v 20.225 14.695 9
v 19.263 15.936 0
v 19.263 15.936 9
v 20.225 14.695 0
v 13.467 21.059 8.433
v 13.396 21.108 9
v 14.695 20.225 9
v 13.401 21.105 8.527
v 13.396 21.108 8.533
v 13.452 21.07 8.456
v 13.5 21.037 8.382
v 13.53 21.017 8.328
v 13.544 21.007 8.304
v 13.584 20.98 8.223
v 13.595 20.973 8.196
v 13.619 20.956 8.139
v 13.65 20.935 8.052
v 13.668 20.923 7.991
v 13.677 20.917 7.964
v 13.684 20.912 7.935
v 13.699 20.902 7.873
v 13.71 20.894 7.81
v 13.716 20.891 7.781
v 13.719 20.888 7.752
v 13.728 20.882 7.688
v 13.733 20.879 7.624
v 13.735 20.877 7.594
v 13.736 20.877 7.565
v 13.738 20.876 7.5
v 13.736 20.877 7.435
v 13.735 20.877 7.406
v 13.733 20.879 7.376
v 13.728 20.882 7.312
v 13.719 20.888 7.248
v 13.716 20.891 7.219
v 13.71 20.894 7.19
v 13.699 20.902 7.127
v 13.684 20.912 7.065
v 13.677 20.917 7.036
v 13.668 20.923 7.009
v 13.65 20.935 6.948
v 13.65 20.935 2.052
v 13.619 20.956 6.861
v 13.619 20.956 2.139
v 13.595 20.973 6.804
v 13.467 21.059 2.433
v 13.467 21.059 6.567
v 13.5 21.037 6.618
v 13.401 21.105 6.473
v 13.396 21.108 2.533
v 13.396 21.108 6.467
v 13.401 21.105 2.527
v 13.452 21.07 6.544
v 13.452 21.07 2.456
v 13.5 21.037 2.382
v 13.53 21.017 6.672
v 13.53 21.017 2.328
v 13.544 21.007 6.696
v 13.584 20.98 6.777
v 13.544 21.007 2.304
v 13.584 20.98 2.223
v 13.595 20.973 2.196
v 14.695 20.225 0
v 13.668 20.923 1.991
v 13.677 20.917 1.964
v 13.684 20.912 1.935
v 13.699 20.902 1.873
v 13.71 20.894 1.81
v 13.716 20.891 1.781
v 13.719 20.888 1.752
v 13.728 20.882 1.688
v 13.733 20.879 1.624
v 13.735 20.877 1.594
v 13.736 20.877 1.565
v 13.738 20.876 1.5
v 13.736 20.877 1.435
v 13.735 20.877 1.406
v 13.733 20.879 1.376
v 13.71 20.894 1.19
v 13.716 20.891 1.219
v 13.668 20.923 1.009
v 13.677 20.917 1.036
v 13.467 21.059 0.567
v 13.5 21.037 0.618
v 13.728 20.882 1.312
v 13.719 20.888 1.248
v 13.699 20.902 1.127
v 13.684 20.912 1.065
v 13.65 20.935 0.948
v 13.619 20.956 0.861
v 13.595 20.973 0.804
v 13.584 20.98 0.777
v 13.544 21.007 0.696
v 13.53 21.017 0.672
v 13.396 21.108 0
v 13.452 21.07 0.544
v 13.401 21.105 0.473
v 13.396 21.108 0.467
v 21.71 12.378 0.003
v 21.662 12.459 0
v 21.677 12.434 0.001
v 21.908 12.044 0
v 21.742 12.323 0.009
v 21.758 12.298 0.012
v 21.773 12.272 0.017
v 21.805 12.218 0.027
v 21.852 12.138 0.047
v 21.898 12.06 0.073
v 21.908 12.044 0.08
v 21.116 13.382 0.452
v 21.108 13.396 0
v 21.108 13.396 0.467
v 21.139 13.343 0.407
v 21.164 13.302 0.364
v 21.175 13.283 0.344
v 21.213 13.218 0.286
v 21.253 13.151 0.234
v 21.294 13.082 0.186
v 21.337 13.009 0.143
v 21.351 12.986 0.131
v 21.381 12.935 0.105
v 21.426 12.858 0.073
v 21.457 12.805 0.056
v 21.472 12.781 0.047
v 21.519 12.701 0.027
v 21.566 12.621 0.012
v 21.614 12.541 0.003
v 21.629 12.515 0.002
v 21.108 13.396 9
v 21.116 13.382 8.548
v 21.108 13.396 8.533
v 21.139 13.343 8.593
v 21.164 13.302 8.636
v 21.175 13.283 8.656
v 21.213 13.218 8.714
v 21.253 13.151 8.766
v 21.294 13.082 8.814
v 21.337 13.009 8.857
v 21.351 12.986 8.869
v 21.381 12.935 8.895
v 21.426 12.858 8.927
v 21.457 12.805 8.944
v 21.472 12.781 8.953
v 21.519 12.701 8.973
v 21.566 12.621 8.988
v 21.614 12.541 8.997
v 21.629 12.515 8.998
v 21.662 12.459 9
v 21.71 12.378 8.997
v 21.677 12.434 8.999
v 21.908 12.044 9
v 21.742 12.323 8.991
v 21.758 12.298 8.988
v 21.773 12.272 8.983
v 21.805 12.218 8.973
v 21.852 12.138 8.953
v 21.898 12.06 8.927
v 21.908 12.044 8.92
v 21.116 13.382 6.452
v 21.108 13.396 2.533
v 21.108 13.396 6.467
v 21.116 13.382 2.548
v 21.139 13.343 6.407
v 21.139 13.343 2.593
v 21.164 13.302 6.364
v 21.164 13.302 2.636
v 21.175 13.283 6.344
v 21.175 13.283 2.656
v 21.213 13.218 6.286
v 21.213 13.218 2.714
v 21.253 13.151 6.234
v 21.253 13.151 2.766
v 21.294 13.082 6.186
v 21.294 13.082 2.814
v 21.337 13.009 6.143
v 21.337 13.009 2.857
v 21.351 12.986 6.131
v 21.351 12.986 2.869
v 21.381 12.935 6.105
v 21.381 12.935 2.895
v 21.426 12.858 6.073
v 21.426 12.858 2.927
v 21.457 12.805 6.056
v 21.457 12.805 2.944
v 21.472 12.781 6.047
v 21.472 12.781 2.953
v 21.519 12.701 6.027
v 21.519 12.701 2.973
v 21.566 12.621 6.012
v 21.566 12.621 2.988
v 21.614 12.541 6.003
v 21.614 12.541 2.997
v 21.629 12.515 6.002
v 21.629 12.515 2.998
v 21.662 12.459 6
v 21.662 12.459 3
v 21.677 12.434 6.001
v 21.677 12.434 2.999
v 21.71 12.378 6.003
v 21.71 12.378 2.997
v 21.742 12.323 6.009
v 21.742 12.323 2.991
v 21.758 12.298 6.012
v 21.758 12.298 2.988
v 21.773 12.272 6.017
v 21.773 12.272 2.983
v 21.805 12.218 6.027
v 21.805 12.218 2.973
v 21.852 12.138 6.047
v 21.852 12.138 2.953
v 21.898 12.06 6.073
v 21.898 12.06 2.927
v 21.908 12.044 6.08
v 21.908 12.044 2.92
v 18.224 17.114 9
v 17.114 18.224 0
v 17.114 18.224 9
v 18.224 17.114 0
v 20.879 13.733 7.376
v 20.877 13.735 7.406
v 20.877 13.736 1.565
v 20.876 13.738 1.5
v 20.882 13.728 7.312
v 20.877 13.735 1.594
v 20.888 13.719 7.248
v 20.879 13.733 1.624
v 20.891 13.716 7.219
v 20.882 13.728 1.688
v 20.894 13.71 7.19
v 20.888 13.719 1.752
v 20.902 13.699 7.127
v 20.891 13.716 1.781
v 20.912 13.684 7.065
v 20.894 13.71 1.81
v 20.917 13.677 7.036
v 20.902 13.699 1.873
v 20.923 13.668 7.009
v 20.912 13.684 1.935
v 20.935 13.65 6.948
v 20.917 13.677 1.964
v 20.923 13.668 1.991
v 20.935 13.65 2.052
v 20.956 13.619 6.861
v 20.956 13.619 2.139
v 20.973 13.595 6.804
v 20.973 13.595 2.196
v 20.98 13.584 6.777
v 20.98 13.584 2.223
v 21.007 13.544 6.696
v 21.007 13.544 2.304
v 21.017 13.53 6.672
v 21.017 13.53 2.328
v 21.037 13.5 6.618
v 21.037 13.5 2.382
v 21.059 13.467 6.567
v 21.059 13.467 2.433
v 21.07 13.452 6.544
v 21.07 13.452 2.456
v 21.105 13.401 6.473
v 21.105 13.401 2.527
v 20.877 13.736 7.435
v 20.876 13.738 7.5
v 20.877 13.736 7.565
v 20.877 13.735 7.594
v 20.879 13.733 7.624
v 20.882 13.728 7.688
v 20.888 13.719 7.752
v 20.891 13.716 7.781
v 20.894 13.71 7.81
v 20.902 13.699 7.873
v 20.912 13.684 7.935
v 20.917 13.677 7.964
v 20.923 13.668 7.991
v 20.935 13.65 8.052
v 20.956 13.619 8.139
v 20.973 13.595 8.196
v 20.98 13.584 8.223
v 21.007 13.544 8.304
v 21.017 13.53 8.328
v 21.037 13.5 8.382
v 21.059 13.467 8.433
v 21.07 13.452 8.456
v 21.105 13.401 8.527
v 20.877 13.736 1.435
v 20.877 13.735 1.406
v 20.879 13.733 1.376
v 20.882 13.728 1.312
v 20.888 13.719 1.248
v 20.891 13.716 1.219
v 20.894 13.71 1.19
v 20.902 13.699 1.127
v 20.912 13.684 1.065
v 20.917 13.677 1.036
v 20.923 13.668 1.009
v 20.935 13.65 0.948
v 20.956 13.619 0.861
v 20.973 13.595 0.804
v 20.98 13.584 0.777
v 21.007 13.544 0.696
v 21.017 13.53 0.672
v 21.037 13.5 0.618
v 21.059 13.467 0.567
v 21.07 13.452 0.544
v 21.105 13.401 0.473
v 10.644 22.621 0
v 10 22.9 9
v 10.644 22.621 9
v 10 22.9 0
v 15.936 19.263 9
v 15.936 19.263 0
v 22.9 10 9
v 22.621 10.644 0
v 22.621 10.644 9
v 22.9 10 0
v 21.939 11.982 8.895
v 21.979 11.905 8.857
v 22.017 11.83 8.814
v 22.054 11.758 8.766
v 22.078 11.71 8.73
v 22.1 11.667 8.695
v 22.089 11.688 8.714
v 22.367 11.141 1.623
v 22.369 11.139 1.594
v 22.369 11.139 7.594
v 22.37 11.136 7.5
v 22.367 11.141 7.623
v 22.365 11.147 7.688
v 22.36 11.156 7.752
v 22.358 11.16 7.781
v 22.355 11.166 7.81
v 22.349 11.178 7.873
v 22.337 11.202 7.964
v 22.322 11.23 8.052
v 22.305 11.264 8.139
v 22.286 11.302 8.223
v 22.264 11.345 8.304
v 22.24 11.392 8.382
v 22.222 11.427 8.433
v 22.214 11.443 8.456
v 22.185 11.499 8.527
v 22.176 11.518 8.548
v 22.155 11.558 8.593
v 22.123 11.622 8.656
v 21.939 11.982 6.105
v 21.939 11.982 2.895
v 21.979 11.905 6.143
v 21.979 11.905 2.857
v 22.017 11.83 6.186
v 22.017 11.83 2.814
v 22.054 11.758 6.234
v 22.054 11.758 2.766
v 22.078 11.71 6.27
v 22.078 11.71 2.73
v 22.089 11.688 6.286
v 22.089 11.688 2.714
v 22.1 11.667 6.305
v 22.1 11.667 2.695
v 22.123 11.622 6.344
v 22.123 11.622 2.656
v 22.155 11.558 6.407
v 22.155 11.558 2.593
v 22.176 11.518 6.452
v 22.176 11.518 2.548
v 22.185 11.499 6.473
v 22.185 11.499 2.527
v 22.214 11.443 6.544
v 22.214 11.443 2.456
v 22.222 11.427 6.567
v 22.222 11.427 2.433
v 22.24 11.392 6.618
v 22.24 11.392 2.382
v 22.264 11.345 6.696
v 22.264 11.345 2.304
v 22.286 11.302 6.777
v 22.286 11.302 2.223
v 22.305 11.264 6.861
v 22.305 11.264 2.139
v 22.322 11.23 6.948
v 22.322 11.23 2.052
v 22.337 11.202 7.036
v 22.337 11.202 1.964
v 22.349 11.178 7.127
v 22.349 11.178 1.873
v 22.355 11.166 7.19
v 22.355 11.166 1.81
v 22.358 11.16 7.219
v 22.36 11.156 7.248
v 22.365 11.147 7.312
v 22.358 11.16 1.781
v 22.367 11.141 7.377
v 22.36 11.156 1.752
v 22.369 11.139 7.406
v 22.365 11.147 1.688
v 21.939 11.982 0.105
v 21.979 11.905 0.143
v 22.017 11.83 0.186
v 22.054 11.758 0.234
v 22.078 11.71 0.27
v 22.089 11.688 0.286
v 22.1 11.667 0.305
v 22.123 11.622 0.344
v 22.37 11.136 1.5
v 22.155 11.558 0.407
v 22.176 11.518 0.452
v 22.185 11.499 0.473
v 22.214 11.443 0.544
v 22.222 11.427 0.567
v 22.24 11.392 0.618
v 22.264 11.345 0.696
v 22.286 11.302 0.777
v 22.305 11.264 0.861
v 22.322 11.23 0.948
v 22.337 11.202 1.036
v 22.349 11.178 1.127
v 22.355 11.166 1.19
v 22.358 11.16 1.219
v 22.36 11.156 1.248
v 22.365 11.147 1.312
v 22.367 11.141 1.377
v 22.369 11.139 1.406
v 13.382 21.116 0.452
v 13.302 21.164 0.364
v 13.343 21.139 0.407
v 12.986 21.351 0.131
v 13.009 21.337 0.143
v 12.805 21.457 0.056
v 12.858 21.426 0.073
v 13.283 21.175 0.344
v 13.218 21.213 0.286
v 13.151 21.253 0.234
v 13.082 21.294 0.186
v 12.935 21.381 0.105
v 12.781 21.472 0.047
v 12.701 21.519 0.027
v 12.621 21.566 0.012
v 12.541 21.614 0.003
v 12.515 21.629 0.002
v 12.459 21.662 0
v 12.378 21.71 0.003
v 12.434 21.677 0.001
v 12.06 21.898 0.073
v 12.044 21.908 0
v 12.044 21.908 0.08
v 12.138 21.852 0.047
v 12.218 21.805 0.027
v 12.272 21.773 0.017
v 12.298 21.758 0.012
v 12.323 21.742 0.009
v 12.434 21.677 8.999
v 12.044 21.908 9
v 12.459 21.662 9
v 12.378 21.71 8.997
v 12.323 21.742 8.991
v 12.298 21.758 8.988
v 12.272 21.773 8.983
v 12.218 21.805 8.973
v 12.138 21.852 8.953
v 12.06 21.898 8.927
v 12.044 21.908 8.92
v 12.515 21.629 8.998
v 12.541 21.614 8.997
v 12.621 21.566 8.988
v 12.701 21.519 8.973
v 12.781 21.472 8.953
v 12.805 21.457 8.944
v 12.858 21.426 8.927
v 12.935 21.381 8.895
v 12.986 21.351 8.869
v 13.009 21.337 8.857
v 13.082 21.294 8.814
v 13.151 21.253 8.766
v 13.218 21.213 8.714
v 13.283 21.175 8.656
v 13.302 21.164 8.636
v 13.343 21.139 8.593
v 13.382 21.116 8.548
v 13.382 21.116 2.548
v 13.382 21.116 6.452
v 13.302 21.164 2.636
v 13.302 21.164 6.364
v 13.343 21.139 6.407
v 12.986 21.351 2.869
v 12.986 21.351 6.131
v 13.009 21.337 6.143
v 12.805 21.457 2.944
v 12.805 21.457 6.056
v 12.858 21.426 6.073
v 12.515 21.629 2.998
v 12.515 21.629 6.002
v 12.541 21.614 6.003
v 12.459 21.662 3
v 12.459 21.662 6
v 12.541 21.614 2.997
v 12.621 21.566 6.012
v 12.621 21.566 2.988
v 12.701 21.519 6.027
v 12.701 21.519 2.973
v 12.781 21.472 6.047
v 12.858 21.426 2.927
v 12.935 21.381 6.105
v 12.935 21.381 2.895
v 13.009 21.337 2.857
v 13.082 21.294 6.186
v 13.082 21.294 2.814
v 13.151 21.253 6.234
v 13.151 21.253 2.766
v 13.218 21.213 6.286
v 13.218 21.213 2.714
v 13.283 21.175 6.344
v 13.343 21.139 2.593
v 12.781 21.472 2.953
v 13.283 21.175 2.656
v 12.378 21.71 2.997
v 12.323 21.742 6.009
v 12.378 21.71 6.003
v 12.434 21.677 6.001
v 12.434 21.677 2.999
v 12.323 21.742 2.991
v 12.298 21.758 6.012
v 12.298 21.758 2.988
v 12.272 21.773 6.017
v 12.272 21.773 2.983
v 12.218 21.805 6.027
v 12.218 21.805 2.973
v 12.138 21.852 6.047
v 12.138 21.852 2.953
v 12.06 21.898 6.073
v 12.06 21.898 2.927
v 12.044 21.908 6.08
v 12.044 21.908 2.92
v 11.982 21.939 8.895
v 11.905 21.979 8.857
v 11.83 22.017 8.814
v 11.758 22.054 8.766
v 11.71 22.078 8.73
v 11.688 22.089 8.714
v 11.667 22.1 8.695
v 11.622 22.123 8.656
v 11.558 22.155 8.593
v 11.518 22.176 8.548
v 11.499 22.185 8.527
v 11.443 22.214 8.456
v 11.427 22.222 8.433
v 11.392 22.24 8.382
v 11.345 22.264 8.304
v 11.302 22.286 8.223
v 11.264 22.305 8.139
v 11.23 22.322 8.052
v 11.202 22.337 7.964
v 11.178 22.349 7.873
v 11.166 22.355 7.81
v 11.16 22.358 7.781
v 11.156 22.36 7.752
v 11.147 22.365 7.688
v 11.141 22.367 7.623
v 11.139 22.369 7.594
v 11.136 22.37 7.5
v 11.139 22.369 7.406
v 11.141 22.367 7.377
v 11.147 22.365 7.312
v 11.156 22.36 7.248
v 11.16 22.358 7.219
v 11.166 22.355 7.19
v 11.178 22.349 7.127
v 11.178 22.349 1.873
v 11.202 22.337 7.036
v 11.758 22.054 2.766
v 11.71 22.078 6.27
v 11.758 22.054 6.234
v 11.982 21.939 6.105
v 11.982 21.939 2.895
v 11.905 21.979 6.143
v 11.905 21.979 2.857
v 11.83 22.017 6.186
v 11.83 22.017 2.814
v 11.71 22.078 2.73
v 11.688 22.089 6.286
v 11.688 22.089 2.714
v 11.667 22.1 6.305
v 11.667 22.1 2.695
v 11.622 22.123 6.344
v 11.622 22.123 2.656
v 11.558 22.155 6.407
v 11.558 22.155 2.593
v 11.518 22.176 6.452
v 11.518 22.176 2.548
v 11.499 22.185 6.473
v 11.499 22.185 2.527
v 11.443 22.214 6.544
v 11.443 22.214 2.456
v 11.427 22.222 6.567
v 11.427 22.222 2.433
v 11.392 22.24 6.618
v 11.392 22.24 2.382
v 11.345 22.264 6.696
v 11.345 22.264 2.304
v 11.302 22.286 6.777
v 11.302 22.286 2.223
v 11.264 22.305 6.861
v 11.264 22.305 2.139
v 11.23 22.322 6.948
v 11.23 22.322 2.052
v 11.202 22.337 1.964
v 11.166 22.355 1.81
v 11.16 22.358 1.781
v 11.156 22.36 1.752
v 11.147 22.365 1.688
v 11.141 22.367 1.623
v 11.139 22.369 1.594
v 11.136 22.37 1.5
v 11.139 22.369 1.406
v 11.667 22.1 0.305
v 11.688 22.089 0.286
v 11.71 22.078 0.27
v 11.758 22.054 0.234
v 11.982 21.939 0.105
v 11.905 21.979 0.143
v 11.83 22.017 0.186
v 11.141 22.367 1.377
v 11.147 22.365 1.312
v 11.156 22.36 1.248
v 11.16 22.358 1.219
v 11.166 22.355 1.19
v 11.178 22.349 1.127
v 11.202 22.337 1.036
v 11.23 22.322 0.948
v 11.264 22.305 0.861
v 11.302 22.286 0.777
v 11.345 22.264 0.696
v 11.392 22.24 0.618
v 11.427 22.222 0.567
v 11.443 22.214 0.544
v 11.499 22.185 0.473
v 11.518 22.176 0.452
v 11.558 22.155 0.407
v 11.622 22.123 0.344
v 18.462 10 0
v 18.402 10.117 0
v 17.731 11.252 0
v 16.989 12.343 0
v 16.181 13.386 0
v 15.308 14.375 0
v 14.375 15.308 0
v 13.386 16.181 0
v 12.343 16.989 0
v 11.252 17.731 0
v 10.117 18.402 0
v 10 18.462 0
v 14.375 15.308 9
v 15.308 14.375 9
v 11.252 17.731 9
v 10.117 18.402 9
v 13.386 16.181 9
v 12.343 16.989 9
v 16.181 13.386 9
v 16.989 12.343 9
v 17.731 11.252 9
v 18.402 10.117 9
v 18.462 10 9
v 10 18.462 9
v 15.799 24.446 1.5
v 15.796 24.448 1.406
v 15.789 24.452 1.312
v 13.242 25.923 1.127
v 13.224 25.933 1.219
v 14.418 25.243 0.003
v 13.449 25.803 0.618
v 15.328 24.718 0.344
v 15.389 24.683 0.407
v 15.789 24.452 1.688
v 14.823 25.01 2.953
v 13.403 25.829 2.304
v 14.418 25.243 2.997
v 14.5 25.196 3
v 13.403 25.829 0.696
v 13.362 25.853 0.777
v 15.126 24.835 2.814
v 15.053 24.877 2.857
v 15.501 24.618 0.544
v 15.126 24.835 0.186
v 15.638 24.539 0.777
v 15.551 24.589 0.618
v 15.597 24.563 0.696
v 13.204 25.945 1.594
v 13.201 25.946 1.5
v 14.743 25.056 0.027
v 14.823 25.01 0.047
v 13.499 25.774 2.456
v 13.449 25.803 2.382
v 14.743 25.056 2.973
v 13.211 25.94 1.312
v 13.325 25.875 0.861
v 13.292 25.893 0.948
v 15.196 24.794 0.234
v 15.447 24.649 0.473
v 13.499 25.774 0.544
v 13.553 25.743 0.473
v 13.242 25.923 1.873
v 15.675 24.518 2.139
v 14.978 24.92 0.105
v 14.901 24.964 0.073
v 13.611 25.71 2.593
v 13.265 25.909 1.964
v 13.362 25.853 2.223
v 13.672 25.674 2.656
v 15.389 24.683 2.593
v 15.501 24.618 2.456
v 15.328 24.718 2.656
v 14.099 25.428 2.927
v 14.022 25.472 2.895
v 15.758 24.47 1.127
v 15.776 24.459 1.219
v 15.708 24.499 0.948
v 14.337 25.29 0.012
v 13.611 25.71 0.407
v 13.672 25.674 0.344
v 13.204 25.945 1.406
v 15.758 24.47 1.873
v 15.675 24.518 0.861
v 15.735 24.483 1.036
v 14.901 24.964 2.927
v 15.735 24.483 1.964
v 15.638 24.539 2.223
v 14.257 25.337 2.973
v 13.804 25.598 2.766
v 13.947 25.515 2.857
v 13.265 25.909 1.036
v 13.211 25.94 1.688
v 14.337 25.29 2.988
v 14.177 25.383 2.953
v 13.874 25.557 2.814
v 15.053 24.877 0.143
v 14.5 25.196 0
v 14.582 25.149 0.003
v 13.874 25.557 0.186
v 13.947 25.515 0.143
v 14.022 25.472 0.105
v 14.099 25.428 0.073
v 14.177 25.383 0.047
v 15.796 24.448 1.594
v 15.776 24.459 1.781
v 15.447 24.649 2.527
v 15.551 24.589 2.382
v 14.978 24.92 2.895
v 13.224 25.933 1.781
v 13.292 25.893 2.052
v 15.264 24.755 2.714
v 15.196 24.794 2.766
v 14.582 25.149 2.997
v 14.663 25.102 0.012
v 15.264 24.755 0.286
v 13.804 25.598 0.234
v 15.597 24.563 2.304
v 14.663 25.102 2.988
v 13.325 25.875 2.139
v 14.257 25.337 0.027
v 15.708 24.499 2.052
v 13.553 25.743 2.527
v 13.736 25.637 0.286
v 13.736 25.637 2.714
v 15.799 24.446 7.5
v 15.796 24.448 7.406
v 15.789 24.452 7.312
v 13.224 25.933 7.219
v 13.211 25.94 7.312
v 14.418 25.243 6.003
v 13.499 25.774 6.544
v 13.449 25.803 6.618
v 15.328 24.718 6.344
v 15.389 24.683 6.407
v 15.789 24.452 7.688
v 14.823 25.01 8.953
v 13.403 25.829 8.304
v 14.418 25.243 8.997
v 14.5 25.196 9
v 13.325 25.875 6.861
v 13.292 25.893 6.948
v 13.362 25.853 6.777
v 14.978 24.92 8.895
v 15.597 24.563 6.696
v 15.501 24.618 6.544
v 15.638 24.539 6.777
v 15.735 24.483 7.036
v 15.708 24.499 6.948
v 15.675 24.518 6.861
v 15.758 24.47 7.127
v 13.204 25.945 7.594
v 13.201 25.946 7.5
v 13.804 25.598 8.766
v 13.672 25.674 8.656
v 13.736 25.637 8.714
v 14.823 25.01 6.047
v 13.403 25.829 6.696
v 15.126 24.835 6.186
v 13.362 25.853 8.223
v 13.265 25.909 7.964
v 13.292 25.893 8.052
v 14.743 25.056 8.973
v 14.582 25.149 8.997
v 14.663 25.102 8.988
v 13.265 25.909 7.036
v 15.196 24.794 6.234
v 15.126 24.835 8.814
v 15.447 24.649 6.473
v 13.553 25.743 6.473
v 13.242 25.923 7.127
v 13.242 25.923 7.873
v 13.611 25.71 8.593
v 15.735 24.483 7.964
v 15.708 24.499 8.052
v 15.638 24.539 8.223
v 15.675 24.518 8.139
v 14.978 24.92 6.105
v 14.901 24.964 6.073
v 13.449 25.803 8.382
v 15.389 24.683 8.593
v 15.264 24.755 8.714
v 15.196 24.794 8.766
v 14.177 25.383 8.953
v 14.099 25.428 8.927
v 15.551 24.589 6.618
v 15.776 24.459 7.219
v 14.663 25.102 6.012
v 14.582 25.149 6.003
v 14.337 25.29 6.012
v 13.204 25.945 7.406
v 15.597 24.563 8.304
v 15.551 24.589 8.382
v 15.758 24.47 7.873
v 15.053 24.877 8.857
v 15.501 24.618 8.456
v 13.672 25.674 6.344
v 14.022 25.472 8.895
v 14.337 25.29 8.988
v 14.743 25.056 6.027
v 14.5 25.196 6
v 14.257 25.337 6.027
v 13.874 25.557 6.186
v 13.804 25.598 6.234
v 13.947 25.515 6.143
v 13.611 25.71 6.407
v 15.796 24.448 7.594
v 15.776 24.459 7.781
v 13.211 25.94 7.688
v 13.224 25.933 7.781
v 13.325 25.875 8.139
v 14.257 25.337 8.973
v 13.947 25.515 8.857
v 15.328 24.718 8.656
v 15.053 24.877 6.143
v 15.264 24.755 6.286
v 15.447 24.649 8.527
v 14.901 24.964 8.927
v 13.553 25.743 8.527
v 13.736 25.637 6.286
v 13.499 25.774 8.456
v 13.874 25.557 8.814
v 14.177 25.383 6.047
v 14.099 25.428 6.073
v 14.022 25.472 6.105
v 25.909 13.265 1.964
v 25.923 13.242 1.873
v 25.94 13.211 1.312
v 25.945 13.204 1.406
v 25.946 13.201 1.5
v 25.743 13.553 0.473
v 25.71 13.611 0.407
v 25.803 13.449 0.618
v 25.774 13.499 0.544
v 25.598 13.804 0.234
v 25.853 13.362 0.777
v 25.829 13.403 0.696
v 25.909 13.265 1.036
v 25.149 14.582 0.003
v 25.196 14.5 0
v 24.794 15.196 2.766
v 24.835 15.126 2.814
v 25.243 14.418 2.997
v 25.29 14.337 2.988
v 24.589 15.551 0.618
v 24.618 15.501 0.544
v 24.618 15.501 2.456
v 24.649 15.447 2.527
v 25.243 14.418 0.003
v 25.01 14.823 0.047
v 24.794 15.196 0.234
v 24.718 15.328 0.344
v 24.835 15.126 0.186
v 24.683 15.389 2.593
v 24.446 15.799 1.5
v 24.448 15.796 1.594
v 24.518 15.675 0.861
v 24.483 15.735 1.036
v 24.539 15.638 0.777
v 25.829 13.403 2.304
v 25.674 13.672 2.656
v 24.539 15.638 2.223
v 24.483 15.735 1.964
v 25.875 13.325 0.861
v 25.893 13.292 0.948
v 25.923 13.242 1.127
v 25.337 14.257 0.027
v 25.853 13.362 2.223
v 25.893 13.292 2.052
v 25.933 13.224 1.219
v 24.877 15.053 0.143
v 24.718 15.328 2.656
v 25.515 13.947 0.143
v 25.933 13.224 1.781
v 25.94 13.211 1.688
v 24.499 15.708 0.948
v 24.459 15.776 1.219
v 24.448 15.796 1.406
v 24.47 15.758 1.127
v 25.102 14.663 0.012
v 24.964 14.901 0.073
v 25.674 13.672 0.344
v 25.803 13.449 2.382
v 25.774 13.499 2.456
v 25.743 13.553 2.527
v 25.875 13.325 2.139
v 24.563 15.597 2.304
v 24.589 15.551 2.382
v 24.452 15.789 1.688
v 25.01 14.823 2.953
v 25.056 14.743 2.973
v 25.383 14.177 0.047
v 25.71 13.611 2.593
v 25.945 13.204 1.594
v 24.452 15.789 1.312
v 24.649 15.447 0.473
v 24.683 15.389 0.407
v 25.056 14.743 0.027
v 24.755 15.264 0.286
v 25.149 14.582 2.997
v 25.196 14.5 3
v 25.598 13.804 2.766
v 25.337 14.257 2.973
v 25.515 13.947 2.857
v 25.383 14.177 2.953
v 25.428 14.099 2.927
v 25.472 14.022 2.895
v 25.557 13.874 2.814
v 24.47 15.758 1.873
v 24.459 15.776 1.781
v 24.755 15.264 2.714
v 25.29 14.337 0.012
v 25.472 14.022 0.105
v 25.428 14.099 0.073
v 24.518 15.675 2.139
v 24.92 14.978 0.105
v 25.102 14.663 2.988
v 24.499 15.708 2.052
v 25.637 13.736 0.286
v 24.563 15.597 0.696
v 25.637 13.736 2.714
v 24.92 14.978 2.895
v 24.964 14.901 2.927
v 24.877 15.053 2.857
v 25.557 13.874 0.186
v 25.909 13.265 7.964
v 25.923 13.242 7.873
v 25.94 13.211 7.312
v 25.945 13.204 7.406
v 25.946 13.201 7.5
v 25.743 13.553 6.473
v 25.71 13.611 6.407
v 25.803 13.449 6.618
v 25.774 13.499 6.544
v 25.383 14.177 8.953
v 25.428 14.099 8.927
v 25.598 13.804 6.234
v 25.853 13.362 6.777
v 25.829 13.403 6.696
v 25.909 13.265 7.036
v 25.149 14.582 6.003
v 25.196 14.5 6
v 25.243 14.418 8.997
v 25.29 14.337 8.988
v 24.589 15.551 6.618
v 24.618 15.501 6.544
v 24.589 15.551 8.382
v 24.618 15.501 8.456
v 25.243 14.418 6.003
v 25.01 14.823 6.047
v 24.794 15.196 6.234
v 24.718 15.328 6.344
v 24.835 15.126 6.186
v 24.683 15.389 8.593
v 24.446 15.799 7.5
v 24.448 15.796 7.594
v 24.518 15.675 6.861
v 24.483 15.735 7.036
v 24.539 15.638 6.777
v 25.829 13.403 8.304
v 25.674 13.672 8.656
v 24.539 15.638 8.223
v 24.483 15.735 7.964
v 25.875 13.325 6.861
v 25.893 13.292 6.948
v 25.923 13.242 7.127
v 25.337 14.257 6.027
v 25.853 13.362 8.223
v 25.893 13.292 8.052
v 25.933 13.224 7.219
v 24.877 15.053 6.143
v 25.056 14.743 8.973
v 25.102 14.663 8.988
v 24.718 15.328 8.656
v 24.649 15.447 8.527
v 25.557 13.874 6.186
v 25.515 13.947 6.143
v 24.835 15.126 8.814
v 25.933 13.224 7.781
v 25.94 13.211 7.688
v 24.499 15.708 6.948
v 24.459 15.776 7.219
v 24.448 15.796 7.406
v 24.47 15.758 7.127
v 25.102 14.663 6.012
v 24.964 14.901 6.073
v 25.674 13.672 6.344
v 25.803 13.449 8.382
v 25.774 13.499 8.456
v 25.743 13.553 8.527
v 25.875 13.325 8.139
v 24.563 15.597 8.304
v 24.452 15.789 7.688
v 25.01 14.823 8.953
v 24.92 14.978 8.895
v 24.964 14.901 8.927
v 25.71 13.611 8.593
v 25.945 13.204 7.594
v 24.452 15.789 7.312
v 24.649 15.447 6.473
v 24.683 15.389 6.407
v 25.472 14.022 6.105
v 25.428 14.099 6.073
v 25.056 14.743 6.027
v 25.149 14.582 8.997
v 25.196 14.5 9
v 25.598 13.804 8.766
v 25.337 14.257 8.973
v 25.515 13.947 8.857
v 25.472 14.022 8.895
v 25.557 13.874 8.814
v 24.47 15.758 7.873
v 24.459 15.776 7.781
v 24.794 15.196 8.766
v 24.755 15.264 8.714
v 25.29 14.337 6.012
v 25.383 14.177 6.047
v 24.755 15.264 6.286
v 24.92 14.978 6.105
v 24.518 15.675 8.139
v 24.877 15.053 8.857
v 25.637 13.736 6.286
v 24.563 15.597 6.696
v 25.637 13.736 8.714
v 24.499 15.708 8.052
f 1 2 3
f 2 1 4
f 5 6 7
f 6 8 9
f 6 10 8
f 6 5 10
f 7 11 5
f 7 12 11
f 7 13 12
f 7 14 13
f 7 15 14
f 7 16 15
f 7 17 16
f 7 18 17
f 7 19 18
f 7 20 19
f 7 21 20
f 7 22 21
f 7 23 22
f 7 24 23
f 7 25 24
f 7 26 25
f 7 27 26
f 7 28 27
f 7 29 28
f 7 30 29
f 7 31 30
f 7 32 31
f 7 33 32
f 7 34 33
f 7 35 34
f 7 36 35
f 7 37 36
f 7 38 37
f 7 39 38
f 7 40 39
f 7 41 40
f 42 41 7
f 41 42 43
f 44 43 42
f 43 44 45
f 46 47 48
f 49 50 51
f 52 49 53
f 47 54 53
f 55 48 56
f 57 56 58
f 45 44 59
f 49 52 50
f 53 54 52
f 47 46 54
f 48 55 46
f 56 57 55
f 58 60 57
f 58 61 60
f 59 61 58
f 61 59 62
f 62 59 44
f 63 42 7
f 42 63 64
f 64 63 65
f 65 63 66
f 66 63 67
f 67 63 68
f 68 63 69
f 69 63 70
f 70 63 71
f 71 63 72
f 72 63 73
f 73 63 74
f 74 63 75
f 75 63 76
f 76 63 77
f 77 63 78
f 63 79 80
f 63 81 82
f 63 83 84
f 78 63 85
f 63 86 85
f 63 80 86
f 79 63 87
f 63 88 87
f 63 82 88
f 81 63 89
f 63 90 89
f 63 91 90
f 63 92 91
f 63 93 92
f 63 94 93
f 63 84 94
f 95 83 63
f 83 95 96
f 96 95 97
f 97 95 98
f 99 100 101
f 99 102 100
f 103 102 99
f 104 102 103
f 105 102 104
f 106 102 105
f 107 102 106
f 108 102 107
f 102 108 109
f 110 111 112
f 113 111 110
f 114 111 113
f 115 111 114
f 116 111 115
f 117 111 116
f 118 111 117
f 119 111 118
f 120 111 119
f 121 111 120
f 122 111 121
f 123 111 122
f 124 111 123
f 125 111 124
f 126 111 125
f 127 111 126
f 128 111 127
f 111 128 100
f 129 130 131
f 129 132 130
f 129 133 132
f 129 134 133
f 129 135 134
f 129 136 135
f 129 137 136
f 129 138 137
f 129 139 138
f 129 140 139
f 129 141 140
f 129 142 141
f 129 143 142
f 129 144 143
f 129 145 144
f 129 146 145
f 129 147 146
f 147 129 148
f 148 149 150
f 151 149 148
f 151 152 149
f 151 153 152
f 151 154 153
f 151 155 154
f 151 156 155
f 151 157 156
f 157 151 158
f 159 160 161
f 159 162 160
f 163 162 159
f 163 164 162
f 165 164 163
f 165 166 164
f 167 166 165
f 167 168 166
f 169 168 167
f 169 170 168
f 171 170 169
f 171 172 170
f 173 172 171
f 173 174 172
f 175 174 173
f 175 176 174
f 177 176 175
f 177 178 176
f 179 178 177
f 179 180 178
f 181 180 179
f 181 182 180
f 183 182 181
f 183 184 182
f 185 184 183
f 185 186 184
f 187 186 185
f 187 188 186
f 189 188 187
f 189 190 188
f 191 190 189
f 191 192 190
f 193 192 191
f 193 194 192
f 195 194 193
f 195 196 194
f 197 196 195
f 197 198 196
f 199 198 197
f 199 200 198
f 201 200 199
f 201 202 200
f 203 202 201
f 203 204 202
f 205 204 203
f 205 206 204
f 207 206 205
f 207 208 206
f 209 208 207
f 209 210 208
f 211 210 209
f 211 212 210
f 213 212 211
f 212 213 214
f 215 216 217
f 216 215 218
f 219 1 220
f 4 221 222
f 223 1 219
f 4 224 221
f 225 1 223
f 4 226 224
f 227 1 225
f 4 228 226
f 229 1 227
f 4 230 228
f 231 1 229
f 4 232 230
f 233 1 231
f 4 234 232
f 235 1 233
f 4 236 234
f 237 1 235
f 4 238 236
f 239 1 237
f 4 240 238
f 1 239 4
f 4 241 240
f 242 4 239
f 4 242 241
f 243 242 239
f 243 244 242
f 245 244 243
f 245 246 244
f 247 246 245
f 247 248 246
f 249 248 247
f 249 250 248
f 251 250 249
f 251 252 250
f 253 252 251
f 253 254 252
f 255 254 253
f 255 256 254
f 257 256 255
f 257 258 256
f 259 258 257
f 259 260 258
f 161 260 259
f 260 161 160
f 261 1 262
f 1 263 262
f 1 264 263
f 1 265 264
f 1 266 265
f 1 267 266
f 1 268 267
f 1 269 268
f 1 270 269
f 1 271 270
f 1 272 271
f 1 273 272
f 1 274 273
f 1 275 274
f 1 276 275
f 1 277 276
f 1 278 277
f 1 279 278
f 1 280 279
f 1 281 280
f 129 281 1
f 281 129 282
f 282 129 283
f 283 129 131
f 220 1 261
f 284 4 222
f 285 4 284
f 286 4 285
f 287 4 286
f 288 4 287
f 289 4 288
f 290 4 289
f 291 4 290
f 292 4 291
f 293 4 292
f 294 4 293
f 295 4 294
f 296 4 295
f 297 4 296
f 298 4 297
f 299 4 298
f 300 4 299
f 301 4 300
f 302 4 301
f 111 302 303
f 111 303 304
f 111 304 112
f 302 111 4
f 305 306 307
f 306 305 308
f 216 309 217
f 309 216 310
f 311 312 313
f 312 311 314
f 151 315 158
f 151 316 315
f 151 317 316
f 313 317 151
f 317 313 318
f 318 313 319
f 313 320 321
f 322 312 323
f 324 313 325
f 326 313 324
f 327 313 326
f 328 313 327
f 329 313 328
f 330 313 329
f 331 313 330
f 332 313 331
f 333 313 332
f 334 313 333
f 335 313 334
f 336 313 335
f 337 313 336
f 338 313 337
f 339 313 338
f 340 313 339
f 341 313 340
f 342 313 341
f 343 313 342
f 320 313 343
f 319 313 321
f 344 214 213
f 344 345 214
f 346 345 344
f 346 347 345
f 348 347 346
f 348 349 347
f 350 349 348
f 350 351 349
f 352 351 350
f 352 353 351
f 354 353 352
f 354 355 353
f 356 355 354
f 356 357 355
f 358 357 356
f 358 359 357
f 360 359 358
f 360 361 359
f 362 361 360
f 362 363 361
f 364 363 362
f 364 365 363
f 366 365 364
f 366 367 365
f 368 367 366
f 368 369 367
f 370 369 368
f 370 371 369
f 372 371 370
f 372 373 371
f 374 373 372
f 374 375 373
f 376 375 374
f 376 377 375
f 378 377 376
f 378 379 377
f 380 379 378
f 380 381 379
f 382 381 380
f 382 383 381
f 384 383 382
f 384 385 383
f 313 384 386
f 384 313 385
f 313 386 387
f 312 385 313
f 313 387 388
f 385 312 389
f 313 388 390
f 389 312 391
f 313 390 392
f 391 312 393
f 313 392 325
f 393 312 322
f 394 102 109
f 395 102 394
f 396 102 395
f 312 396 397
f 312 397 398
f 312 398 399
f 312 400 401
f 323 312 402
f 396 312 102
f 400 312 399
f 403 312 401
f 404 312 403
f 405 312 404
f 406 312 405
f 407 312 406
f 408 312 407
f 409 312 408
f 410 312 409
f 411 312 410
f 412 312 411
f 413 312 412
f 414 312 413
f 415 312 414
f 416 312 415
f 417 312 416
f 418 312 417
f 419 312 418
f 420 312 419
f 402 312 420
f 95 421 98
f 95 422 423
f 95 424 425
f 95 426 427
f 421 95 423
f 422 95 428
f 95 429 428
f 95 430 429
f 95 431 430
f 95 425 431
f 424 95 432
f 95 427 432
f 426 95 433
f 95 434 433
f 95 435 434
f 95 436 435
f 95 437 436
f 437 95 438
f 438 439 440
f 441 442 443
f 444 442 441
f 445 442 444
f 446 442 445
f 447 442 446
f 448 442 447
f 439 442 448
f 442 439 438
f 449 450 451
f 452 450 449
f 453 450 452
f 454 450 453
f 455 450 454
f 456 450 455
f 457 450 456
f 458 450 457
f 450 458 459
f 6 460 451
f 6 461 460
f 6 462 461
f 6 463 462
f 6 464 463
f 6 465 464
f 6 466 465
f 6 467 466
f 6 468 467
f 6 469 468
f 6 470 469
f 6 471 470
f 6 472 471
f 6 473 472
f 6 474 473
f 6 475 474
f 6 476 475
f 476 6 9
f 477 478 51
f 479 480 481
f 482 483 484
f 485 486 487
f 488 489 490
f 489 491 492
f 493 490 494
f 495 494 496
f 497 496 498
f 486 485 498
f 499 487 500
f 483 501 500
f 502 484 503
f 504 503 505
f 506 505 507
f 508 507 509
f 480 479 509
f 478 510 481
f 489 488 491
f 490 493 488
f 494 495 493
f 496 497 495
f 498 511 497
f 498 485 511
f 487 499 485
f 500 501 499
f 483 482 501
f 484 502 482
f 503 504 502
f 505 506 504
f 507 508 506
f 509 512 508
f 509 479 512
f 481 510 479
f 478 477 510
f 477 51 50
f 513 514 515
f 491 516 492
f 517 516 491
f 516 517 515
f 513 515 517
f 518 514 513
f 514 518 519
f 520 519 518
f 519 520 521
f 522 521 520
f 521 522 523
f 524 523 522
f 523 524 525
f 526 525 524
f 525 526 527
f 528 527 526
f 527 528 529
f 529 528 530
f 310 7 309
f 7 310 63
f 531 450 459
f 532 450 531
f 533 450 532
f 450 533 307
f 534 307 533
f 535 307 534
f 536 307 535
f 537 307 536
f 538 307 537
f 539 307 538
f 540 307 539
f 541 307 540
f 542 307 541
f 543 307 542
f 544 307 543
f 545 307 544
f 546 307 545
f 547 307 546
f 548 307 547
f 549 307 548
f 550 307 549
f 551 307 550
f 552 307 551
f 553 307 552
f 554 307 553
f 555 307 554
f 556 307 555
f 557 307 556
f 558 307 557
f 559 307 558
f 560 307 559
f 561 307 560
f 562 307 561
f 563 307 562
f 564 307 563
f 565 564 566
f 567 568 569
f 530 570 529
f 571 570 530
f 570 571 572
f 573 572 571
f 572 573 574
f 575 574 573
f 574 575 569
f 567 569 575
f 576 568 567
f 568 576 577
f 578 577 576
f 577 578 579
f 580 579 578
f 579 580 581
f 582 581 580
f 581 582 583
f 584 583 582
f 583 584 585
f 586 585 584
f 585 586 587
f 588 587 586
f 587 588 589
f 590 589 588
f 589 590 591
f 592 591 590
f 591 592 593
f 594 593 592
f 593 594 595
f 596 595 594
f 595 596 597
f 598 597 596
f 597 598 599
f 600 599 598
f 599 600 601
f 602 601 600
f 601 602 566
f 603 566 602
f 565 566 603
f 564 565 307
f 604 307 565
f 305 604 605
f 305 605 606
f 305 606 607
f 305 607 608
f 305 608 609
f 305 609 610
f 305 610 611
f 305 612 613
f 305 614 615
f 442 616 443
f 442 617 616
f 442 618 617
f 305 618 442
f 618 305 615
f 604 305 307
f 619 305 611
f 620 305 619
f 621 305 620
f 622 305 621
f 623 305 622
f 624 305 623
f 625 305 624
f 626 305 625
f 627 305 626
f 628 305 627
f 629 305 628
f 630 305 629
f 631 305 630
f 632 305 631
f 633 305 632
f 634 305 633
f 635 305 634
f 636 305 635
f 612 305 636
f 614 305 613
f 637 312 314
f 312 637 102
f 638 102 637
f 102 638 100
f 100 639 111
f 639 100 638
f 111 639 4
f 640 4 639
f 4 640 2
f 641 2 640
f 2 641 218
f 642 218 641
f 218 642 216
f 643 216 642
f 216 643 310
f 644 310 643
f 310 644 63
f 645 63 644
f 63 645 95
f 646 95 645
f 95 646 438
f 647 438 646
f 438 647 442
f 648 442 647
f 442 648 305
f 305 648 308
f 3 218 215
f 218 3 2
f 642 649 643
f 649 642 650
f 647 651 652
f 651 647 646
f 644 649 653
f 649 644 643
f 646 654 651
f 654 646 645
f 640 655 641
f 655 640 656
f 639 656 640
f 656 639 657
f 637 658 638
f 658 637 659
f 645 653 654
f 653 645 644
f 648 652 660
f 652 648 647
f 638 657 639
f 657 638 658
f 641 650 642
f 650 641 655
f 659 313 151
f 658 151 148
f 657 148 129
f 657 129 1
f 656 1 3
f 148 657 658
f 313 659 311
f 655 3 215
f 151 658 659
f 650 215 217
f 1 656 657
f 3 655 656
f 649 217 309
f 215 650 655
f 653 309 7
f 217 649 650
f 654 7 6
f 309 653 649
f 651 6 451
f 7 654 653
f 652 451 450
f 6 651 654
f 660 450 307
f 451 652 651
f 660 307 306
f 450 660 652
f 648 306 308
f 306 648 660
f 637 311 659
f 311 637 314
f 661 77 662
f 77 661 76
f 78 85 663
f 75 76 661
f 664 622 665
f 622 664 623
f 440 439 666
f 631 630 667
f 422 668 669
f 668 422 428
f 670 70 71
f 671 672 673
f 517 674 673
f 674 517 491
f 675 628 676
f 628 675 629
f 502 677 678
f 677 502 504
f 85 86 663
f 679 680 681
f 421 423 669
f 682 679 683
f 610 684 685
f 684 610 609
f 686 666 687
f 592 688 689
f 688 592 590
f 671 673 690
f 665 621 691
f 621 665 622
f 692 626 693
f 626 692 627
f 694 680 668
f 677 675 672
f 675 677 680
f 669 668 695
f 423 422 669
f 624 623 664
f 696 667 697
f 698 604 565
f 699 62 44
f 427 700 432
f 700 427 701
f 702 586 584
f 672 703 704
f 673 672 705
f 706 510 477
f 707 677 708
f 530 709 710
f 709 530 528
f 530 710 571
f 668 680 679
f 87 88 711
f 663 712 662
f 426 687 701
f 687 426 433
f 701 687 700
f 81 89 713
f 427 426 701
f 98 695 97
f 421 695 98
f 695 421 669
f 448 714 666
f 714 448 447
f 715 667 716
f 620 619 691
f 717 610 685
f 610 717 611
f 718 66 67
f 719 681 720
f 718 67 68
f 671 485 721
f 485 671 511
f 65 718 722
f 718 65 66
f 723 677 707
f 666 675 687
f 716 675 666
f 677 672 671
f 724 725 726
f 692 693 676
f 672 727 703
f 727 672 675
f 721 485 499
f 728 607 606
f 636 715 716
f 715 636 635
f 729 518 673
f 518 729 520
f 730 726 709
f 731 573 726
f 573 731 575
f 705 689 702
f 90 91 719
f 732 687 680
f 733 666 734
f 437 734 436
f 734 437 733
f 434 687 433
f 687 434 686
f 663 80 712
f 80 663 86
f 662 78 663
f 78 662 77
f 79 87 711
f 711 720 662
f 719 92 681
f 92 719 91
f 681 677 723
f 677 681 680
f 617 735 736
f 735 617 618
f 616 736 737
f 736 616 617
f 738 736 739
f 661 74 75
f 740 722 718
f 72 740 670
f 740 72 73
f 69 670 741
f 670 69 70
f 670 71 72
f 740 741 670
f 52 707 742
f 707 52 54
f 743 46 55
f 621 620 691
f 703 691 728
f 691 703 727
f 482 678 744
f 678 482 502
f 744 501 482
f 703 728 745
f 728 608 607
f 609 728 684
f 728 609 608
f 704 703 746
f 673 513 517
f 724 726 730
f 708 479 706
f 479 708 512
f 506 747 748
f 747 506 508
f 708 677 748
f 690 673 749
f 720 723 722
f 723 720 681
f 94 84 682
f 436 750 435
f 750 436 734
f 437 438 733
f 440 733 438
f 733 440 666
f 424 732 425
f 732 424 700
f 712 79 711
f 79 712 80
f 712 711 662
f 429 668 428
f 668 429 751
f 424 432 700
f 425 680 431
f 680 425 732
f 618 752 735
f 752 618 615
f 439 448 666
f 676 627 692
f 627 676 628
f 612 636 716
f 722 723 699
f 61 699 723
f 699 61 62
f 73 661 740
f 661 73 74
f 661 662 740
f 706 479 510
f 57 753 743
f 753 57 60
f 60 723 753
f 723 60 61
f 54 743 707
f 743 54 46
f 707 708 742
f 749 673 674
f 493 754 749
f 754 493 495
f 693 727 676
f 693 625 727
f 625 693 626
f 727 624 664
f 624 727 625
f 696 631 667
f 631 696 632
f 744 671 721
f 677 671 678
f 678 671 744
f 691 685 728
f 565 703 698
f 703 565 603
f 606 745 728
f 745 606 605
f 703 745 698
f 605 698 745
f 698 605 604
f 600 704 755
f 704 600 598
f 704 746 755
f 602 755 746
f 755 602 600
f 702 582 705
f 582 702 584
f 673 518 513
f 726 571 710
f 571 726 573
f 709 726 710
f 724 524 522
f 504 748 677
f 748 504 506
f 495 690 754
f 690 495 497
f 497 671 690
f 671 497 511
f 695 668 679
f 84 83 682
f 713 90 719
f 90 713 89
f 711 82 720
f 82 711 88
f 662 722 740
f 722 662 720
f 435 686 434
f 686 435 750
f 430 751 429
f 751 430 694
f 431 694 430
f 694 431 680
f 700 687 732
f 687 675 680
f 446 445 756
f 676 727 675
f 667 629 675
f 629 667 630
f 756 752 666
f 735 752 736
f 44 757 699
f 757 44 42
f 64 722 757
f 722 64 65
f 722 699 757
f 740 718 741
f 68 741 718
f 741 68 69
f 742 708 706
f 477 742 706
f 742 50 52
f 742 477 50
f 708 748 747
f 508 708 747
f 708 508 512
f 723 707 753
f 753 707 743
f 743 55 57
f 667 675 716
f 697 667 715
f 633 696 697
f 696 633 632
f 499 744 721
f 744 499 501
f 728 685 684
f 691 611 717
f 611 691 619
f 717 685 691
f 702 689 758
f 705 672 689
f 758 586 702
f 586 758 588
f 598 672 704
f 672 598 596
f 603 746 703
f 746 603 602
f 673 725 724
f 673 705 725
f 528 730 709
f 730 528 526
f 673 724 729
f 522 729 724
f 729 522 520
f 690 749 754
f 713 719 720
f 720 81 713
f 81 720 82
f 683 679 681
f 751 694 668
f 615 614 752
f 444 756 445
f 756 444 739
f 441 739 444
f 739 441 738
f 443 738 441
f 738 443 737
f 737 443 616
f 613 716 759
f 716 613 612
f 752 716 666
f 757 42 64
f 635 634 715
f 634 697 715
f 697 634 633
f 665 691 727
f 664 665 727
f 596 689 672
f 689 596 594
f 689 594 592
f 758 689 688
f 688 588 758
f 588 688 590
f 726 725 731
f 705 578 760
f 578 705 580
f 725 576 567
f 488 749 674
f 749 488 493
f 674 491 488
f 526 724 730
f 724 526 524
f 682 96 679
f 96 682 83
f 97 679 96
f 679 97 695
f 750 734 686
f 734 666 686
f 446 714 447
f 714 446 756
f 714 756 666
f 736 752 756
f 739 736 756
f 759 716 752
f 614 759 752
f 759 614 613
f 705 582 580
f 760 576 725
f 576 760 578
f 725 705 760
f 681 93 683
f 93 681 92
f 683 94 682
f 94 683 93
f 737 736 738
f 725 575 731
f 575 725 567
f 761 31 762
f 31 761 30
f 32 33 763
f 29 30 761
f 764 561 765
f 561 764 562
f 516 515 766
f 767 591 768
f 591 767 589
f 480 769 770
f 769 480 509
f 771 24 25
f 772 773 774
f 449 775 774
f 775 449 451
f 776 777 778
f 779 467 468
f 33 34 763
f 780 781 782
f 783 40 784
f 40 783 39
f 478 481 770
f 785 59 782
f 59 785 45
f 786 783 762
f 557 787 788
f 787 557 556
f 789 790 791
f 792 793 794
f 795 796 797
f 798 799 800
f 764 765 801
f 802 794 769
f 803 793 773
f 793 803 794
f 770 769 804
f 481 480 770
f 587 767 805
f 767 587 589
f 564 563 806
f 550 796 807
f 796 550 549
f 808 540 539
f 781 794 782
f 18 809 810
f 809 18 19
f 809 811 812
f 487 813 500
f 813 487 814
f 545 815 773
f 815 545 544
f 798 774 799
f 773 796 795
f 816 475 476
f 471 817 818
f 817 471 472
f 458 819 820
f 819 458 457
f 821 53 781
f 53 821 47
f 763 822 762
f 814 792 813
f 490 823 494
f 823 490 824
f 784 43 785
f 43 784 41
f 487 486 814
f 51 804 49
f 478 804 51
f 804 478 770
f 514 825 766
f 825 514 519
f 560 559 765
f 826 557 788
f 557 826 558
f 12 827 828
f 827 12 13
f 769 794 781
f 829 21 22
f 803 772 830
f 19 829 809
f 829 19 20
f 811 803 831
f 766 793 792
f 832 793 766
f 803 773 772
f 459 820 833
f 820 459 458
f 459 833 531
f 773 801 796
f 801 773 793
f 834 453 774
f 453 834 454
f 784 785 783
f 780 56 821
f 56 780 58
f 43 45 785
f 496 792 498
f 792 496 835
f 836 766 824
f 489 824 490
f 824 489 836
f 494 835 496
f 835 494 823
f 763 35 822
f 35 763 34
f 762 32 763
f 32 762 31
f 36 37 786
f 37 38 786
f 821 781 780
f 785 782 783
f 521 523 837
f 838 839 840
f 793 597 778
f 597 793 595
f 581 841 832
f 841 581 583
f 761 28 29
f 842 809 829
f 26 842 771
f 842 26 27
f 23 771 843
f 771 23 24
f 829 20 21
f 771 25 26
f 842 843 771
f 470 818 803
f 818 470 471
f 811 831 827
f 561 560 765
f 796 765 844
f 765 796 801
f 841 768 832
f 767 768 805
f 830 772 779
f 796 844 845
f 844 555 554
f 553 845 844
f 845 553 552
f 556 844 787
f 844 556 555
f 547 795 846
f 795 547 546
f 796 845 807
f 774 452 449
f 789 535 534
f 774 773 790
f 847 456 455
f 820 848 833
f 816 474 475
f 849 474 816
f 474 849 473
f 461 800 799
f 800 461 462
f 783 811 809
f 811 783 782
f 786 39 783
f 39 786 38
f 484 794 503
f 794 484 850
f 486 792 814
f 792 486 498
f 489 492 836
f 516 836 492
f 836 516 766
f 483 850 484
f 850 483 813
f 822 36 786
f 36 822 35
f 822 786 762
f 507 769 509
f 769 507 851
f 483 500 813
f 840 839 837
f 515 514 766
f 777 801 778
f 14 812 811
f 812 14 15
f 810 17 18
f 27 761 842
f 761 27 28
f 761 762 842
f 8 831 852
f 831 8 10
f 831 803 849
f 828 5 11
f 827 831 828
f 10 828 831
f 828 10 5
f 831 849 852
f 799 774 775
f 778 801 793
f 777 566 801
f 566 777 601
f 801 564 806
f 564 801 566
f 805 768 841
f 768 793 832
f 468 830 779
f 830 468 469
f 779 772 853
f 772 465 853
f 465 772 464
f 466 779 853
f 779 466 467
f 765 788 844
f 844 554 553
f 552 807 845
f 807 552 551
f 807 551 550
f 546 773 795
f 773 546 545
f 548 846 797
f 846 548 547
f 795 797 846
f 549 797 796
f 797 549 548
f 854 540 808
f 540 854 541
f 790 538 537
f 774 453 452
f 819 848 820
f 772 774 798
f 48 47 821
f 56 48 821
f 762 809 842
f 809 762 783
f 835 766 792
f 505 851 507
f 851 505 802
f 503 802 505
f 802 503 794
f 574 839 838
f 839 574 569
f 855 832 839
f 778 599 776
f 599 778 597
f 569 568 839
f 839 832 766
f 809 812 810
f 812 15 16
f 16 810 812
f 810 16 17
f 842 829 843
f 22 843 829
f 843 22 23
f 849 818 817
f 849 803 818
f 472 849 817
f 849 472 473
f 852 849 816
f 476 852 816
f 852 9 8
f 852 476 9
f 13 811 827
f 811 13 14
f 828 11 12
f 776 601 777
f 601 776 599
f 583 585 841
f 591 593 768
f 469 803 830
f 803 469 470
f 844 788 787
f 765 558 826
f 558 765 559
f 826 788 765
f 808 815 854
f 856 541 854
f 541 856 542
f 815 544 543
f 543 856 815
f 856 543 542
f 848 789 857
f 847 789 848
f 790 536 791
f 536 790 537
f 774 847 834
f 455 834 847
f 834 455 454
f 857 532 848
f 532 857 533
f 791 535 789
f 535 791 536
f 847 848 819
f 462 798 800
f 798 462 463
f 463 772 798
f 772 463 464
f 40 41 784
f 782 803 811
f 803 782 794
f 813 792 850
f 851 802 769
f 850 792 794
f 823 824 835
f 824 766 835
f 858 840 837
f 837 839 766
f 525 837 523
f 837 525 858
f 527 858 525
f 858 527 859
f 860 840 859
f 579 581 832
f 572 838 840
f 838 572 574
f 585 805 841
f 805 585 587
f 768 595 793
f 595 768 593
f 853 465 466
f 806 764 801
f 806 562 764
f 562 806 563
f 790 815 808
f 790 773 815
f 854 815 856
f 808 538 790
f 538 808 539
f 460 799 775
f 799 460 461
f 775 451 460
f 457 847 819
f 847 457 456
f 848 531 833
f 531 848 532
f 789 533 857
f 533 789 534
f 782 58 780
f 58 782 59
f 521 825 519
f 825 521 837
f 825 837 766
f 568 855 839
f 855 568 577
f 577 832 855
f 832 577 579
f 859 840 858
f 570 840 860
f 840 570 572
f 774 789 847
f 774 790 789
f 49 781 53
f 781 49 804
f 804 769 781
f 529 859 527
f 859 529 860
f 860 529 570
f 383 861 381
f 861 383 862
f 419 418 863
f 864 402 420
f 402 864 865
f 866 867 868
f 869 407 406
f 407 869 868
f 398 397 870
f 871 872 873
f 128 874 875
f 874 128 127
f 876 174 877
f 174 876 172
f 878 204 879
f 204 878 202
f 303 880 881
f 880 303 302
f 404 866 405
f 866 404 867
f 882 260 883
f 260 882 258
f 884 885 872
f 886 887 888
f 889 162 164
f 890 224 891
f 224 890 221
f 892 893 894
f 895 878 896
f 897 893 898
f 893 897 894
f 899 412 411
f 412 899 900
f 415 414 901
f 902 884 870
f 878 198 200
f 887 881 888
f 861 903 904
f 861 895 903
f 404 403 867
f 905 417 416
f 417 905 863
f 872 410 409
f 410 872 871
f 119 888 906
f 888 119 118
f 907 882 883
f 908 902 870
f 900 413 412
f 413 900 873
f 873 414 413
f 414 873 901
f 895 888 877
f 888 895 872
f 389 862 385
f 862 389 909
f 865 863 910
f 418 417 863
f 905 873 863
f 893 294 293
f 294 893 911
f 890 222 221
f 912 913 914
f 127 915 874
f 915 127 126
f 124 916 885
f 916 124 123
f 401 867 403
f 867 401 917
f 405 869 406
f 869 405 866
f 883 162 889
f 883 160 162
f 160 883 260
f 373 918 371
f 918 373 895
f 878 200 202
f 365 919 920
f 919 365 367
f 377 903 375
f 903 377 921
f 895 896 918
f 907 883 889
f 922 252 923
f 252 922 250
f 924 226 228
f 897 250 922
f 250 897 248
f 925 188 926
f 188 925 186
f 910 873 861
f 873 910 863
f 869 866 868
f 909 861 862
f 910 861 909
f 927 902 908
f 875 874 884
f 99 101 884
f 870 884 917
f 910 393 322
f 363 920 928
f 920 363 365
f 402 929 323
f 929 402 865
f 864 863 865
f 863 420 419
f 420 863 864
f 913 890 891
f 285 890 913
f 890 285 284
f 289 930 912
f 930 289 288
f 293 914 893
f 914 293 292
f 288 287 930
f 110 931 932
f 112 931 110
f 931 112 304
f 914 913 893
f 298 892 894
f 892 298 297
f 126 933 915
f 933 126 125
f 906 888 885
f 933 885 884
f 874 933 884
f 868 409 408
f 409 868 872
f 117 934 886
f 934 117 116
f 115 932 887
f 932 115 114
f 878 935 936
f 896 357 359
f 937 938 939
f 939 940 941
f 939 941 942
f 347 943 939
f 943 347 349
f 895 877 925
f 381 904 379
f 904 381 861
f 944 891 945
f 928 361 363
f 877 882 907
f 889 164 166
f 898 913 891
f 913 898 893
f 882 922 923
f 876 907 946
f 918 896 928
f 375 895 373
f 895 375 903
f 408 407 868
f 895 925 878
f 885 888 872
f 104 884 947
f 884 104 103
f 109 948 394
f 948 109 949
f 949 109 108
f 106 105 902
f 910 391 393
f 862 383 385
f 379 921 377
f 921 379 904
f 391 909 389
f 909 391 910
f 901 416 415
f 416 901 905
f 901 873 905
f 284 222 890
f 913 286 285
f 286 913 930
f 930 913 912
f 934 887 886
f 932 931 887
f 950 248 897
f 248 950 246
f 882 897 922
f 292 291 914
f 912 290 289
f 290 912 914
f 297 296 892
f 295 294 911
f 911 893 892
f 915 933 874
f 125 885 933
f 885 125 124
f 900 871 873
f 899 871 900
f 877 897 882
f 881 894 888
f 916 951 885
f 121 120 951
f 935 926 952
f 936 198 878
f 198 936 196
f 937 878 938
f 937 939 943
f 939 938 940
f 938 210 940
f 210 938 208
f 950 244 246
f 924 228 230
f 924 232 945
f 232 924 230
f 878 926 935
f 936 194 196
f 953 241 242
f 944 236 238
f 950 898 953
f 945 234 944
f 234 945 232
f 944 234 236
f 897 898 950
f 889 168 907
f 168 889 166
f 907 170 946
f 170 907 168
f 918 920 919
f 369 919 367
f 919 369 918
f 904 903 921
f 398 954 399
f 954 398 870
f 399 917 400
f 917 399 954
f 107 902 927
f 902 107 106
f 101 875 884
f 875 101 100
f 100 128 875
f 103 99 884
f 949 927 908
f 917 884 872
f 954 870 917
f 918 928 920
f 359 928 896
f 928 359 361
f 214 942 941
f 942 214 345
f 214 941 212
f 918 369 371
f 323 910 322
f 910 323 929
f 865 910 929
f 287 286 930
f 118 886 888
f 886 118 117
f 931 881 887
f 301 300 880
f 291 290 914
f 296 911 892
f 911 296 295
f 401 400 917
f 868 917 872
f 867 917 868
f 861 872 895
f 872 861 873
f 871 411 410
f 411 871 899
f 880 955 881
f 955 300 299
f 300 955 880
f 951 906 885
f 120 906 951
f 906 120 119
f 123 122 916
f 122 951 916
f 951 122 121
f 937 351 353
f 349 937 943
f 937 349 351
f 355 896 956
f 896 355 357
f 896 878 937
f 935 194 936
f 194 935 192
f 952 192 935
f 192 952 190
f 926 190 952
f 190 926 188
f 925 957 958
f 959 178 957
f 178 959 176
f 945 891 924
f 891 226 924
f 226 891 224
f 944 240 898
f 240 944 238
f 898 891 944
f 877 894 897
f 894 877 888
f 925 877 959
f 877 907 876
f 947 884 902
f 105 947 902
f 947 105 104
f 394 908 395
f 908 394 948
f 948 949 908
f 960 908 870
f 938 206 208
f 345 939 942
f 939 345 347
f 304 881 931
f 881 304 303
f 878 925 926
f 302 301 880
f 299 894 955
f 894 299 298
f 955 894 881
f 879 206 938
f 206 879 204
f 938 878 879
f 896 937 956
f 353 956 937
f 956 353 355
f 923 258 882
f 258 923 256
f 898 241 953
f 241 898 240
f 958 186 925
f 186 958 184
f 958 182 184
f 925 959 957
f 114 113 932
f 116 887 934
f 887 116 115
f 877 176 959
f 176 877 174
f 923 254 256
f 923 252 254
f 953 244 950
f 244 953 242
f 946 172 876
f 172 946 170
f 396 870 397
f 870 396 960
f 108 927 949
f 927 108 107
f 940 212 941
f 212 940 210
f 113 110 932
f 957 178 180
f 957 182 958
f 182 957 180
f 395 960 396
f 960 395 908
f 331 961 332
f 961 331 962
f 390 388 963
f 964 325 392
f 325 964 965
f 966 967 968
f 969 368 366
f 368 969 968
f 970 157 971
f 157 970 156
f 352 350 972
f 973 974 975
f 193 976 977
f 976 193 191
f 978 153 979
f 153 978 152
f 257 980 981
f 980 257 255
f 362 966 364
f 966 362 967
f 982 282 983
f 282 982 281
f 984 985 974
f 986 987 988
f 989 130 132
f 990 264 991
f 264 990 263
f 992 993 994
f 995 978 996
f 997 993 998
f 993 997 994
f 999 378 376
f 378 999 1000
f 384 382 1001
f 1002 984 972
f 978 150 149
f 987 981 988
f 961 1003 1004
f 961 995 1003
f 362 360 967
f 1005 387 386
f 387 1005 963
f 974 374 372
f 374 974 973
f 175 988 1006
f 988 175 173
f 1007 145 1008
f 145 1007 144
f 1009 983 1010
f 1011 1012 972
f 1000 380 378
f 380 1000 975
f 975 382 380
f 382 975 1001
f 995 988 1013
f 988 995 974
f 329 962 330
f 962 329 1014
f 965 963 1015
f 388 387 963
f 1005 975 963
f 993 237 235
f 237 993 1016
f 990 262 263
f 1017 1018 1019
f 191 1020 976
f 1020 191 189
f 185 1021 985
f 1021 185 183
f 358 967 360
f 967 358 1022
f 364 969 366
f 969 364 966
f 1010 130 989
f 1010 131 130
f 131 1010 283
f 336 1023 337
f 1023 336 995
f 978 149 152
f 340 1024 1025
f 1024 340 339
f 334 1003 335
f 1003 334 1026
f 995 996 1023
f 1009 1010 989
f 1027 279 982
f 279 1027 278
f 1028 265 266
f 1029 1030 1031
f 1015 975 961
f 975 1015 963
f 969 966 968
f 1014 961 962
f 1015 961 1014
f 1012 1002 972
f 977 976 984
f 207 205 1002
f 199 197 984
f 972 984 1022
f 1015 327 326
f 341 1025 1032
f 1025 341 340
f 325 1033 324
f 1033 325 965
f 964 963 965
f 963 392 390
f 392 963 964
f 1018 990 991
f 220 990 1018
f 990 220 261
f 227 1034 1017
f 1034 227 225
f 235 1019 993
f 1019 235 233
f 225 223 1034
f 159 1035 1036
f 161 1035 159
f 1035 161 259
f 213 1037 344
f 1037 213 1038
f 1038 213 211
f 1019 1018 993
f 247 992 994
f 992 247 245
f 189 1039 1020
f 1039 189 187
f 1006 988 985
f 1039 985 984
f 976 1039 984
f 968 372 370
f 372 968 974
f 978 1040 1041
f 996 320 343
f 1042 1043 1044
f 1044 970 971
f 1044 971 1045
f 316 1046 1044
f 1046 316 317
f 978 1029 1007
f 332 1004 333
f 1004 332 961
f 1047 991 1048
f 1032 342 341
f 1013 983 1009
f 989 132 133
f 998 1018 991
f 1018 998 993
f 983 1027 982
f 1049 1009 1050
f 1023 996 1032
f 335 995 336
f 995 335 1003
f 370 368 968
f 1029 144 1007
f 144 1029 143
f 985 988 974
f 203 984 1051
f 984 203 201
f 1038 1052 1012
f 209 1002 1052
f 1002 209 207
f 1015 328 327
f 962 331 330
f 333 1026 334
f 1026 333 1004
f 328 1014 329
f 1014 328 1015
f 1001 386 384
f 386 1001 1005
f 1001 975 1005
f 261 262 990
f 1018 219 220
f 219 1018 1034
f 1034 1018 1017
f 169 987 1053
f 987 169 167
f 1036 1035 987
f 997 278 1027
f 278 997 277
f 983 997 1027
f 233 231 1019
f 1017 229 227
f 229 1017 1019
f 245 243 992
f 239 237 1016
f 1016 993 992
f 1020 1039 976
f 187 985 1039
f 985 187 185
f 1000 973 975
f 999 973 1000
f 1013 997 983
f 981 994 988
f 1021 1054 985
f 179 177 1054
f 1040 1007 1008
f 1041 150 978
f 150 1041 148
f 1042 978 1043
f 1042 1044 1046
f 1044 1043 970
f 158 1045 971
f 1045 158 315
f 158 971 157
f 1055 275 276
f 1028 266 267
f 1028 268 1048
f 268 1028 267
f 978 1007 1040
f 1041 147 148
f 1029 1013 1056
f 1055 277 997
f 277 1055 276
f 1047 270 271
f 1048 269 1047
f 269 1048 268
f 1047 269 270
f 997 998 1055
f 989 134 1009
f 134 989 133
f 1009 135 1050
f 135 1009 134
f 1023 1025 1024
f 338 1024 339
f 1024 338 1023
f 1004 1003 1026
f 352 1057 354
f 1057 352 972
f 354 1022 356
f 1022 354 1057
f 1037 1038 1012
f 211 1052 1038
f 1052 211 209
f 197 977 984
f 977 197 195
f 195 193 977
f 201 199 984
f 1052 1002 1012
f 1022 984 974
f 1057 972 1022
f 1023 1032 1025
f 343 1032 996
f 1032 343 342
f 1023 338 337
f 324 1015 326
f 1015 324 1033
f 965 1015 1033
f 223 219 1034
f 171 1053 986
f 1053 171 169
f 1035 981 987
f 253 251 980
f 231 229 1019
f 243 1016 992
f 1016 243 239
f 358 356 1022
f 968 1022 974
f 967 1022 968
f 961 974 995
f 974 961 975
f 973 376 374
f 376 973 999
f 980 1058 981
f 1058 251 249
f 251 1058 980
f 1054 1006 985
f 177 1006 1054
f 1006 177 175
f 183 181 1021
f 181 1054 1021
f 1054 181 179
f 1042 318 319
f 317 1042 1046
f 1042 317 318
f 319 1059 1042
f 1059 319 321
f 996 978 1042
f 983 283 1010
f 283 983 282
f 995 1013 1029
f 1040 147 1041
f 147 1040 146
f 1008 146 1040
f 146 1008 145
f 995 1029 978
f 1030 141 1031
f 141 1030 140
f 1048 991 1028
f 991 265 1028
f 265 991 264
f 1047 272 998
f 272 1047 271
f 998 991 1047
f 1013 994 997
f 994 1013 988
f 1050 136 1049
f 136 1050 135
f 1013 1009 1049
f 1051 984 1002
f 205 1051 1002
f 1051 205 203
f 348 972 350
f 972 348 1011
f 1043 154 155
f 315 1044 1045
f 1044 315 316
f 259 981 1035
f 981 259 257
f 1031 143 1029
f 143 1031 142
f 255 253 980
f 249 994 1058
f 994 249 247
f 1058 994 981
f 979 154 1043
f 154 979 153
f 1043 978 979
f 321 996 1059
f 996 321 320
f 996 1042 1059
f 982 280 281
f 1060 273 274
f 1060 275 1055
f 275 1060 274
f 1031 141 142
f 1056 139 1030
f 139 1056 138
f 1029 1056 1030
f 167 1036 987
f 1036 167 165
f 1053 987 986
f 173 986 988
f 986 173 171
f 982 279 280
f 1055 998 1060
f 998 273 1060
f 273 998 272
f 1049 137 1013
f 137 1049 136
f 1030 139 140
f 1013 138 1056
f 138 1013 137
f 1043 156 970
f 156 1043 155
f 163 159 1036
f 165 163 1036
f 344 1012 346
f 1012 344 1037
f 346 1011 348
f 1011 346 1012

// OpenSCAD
$fn=100;
intersection()
{
	difference()
	{
		cylinder(h=10,r=25,center = false);
		translate([0,0,-1])
		{
			cylinder(h=15,r=21,center = false);
		}
	}
	translate([10,10,-1])
	{
		cube([30,30,10]);
	}
}
translate([11.5,20,1.5])
{
	rotate([-90,0,-30])
	{
		cylinder(h=6,r=1.5,center = false);
	}
}
translate([11.5,20,7.5])
{
	rotate([-90,0,-30])
	{
		cylinder(h=6,r=1.5,center = false);
	}
}
translate([20,11.5,1.5])
{
	rotate([-90,0,-60])
	{
		cylinder(h=6,r=1.5,center = false);
	}
}
translate([20,11.5,7.5])
{
	rotate([-90,0,-60])
	{
		cylinder(h=6,r=1.5,center = false);
	}
}
